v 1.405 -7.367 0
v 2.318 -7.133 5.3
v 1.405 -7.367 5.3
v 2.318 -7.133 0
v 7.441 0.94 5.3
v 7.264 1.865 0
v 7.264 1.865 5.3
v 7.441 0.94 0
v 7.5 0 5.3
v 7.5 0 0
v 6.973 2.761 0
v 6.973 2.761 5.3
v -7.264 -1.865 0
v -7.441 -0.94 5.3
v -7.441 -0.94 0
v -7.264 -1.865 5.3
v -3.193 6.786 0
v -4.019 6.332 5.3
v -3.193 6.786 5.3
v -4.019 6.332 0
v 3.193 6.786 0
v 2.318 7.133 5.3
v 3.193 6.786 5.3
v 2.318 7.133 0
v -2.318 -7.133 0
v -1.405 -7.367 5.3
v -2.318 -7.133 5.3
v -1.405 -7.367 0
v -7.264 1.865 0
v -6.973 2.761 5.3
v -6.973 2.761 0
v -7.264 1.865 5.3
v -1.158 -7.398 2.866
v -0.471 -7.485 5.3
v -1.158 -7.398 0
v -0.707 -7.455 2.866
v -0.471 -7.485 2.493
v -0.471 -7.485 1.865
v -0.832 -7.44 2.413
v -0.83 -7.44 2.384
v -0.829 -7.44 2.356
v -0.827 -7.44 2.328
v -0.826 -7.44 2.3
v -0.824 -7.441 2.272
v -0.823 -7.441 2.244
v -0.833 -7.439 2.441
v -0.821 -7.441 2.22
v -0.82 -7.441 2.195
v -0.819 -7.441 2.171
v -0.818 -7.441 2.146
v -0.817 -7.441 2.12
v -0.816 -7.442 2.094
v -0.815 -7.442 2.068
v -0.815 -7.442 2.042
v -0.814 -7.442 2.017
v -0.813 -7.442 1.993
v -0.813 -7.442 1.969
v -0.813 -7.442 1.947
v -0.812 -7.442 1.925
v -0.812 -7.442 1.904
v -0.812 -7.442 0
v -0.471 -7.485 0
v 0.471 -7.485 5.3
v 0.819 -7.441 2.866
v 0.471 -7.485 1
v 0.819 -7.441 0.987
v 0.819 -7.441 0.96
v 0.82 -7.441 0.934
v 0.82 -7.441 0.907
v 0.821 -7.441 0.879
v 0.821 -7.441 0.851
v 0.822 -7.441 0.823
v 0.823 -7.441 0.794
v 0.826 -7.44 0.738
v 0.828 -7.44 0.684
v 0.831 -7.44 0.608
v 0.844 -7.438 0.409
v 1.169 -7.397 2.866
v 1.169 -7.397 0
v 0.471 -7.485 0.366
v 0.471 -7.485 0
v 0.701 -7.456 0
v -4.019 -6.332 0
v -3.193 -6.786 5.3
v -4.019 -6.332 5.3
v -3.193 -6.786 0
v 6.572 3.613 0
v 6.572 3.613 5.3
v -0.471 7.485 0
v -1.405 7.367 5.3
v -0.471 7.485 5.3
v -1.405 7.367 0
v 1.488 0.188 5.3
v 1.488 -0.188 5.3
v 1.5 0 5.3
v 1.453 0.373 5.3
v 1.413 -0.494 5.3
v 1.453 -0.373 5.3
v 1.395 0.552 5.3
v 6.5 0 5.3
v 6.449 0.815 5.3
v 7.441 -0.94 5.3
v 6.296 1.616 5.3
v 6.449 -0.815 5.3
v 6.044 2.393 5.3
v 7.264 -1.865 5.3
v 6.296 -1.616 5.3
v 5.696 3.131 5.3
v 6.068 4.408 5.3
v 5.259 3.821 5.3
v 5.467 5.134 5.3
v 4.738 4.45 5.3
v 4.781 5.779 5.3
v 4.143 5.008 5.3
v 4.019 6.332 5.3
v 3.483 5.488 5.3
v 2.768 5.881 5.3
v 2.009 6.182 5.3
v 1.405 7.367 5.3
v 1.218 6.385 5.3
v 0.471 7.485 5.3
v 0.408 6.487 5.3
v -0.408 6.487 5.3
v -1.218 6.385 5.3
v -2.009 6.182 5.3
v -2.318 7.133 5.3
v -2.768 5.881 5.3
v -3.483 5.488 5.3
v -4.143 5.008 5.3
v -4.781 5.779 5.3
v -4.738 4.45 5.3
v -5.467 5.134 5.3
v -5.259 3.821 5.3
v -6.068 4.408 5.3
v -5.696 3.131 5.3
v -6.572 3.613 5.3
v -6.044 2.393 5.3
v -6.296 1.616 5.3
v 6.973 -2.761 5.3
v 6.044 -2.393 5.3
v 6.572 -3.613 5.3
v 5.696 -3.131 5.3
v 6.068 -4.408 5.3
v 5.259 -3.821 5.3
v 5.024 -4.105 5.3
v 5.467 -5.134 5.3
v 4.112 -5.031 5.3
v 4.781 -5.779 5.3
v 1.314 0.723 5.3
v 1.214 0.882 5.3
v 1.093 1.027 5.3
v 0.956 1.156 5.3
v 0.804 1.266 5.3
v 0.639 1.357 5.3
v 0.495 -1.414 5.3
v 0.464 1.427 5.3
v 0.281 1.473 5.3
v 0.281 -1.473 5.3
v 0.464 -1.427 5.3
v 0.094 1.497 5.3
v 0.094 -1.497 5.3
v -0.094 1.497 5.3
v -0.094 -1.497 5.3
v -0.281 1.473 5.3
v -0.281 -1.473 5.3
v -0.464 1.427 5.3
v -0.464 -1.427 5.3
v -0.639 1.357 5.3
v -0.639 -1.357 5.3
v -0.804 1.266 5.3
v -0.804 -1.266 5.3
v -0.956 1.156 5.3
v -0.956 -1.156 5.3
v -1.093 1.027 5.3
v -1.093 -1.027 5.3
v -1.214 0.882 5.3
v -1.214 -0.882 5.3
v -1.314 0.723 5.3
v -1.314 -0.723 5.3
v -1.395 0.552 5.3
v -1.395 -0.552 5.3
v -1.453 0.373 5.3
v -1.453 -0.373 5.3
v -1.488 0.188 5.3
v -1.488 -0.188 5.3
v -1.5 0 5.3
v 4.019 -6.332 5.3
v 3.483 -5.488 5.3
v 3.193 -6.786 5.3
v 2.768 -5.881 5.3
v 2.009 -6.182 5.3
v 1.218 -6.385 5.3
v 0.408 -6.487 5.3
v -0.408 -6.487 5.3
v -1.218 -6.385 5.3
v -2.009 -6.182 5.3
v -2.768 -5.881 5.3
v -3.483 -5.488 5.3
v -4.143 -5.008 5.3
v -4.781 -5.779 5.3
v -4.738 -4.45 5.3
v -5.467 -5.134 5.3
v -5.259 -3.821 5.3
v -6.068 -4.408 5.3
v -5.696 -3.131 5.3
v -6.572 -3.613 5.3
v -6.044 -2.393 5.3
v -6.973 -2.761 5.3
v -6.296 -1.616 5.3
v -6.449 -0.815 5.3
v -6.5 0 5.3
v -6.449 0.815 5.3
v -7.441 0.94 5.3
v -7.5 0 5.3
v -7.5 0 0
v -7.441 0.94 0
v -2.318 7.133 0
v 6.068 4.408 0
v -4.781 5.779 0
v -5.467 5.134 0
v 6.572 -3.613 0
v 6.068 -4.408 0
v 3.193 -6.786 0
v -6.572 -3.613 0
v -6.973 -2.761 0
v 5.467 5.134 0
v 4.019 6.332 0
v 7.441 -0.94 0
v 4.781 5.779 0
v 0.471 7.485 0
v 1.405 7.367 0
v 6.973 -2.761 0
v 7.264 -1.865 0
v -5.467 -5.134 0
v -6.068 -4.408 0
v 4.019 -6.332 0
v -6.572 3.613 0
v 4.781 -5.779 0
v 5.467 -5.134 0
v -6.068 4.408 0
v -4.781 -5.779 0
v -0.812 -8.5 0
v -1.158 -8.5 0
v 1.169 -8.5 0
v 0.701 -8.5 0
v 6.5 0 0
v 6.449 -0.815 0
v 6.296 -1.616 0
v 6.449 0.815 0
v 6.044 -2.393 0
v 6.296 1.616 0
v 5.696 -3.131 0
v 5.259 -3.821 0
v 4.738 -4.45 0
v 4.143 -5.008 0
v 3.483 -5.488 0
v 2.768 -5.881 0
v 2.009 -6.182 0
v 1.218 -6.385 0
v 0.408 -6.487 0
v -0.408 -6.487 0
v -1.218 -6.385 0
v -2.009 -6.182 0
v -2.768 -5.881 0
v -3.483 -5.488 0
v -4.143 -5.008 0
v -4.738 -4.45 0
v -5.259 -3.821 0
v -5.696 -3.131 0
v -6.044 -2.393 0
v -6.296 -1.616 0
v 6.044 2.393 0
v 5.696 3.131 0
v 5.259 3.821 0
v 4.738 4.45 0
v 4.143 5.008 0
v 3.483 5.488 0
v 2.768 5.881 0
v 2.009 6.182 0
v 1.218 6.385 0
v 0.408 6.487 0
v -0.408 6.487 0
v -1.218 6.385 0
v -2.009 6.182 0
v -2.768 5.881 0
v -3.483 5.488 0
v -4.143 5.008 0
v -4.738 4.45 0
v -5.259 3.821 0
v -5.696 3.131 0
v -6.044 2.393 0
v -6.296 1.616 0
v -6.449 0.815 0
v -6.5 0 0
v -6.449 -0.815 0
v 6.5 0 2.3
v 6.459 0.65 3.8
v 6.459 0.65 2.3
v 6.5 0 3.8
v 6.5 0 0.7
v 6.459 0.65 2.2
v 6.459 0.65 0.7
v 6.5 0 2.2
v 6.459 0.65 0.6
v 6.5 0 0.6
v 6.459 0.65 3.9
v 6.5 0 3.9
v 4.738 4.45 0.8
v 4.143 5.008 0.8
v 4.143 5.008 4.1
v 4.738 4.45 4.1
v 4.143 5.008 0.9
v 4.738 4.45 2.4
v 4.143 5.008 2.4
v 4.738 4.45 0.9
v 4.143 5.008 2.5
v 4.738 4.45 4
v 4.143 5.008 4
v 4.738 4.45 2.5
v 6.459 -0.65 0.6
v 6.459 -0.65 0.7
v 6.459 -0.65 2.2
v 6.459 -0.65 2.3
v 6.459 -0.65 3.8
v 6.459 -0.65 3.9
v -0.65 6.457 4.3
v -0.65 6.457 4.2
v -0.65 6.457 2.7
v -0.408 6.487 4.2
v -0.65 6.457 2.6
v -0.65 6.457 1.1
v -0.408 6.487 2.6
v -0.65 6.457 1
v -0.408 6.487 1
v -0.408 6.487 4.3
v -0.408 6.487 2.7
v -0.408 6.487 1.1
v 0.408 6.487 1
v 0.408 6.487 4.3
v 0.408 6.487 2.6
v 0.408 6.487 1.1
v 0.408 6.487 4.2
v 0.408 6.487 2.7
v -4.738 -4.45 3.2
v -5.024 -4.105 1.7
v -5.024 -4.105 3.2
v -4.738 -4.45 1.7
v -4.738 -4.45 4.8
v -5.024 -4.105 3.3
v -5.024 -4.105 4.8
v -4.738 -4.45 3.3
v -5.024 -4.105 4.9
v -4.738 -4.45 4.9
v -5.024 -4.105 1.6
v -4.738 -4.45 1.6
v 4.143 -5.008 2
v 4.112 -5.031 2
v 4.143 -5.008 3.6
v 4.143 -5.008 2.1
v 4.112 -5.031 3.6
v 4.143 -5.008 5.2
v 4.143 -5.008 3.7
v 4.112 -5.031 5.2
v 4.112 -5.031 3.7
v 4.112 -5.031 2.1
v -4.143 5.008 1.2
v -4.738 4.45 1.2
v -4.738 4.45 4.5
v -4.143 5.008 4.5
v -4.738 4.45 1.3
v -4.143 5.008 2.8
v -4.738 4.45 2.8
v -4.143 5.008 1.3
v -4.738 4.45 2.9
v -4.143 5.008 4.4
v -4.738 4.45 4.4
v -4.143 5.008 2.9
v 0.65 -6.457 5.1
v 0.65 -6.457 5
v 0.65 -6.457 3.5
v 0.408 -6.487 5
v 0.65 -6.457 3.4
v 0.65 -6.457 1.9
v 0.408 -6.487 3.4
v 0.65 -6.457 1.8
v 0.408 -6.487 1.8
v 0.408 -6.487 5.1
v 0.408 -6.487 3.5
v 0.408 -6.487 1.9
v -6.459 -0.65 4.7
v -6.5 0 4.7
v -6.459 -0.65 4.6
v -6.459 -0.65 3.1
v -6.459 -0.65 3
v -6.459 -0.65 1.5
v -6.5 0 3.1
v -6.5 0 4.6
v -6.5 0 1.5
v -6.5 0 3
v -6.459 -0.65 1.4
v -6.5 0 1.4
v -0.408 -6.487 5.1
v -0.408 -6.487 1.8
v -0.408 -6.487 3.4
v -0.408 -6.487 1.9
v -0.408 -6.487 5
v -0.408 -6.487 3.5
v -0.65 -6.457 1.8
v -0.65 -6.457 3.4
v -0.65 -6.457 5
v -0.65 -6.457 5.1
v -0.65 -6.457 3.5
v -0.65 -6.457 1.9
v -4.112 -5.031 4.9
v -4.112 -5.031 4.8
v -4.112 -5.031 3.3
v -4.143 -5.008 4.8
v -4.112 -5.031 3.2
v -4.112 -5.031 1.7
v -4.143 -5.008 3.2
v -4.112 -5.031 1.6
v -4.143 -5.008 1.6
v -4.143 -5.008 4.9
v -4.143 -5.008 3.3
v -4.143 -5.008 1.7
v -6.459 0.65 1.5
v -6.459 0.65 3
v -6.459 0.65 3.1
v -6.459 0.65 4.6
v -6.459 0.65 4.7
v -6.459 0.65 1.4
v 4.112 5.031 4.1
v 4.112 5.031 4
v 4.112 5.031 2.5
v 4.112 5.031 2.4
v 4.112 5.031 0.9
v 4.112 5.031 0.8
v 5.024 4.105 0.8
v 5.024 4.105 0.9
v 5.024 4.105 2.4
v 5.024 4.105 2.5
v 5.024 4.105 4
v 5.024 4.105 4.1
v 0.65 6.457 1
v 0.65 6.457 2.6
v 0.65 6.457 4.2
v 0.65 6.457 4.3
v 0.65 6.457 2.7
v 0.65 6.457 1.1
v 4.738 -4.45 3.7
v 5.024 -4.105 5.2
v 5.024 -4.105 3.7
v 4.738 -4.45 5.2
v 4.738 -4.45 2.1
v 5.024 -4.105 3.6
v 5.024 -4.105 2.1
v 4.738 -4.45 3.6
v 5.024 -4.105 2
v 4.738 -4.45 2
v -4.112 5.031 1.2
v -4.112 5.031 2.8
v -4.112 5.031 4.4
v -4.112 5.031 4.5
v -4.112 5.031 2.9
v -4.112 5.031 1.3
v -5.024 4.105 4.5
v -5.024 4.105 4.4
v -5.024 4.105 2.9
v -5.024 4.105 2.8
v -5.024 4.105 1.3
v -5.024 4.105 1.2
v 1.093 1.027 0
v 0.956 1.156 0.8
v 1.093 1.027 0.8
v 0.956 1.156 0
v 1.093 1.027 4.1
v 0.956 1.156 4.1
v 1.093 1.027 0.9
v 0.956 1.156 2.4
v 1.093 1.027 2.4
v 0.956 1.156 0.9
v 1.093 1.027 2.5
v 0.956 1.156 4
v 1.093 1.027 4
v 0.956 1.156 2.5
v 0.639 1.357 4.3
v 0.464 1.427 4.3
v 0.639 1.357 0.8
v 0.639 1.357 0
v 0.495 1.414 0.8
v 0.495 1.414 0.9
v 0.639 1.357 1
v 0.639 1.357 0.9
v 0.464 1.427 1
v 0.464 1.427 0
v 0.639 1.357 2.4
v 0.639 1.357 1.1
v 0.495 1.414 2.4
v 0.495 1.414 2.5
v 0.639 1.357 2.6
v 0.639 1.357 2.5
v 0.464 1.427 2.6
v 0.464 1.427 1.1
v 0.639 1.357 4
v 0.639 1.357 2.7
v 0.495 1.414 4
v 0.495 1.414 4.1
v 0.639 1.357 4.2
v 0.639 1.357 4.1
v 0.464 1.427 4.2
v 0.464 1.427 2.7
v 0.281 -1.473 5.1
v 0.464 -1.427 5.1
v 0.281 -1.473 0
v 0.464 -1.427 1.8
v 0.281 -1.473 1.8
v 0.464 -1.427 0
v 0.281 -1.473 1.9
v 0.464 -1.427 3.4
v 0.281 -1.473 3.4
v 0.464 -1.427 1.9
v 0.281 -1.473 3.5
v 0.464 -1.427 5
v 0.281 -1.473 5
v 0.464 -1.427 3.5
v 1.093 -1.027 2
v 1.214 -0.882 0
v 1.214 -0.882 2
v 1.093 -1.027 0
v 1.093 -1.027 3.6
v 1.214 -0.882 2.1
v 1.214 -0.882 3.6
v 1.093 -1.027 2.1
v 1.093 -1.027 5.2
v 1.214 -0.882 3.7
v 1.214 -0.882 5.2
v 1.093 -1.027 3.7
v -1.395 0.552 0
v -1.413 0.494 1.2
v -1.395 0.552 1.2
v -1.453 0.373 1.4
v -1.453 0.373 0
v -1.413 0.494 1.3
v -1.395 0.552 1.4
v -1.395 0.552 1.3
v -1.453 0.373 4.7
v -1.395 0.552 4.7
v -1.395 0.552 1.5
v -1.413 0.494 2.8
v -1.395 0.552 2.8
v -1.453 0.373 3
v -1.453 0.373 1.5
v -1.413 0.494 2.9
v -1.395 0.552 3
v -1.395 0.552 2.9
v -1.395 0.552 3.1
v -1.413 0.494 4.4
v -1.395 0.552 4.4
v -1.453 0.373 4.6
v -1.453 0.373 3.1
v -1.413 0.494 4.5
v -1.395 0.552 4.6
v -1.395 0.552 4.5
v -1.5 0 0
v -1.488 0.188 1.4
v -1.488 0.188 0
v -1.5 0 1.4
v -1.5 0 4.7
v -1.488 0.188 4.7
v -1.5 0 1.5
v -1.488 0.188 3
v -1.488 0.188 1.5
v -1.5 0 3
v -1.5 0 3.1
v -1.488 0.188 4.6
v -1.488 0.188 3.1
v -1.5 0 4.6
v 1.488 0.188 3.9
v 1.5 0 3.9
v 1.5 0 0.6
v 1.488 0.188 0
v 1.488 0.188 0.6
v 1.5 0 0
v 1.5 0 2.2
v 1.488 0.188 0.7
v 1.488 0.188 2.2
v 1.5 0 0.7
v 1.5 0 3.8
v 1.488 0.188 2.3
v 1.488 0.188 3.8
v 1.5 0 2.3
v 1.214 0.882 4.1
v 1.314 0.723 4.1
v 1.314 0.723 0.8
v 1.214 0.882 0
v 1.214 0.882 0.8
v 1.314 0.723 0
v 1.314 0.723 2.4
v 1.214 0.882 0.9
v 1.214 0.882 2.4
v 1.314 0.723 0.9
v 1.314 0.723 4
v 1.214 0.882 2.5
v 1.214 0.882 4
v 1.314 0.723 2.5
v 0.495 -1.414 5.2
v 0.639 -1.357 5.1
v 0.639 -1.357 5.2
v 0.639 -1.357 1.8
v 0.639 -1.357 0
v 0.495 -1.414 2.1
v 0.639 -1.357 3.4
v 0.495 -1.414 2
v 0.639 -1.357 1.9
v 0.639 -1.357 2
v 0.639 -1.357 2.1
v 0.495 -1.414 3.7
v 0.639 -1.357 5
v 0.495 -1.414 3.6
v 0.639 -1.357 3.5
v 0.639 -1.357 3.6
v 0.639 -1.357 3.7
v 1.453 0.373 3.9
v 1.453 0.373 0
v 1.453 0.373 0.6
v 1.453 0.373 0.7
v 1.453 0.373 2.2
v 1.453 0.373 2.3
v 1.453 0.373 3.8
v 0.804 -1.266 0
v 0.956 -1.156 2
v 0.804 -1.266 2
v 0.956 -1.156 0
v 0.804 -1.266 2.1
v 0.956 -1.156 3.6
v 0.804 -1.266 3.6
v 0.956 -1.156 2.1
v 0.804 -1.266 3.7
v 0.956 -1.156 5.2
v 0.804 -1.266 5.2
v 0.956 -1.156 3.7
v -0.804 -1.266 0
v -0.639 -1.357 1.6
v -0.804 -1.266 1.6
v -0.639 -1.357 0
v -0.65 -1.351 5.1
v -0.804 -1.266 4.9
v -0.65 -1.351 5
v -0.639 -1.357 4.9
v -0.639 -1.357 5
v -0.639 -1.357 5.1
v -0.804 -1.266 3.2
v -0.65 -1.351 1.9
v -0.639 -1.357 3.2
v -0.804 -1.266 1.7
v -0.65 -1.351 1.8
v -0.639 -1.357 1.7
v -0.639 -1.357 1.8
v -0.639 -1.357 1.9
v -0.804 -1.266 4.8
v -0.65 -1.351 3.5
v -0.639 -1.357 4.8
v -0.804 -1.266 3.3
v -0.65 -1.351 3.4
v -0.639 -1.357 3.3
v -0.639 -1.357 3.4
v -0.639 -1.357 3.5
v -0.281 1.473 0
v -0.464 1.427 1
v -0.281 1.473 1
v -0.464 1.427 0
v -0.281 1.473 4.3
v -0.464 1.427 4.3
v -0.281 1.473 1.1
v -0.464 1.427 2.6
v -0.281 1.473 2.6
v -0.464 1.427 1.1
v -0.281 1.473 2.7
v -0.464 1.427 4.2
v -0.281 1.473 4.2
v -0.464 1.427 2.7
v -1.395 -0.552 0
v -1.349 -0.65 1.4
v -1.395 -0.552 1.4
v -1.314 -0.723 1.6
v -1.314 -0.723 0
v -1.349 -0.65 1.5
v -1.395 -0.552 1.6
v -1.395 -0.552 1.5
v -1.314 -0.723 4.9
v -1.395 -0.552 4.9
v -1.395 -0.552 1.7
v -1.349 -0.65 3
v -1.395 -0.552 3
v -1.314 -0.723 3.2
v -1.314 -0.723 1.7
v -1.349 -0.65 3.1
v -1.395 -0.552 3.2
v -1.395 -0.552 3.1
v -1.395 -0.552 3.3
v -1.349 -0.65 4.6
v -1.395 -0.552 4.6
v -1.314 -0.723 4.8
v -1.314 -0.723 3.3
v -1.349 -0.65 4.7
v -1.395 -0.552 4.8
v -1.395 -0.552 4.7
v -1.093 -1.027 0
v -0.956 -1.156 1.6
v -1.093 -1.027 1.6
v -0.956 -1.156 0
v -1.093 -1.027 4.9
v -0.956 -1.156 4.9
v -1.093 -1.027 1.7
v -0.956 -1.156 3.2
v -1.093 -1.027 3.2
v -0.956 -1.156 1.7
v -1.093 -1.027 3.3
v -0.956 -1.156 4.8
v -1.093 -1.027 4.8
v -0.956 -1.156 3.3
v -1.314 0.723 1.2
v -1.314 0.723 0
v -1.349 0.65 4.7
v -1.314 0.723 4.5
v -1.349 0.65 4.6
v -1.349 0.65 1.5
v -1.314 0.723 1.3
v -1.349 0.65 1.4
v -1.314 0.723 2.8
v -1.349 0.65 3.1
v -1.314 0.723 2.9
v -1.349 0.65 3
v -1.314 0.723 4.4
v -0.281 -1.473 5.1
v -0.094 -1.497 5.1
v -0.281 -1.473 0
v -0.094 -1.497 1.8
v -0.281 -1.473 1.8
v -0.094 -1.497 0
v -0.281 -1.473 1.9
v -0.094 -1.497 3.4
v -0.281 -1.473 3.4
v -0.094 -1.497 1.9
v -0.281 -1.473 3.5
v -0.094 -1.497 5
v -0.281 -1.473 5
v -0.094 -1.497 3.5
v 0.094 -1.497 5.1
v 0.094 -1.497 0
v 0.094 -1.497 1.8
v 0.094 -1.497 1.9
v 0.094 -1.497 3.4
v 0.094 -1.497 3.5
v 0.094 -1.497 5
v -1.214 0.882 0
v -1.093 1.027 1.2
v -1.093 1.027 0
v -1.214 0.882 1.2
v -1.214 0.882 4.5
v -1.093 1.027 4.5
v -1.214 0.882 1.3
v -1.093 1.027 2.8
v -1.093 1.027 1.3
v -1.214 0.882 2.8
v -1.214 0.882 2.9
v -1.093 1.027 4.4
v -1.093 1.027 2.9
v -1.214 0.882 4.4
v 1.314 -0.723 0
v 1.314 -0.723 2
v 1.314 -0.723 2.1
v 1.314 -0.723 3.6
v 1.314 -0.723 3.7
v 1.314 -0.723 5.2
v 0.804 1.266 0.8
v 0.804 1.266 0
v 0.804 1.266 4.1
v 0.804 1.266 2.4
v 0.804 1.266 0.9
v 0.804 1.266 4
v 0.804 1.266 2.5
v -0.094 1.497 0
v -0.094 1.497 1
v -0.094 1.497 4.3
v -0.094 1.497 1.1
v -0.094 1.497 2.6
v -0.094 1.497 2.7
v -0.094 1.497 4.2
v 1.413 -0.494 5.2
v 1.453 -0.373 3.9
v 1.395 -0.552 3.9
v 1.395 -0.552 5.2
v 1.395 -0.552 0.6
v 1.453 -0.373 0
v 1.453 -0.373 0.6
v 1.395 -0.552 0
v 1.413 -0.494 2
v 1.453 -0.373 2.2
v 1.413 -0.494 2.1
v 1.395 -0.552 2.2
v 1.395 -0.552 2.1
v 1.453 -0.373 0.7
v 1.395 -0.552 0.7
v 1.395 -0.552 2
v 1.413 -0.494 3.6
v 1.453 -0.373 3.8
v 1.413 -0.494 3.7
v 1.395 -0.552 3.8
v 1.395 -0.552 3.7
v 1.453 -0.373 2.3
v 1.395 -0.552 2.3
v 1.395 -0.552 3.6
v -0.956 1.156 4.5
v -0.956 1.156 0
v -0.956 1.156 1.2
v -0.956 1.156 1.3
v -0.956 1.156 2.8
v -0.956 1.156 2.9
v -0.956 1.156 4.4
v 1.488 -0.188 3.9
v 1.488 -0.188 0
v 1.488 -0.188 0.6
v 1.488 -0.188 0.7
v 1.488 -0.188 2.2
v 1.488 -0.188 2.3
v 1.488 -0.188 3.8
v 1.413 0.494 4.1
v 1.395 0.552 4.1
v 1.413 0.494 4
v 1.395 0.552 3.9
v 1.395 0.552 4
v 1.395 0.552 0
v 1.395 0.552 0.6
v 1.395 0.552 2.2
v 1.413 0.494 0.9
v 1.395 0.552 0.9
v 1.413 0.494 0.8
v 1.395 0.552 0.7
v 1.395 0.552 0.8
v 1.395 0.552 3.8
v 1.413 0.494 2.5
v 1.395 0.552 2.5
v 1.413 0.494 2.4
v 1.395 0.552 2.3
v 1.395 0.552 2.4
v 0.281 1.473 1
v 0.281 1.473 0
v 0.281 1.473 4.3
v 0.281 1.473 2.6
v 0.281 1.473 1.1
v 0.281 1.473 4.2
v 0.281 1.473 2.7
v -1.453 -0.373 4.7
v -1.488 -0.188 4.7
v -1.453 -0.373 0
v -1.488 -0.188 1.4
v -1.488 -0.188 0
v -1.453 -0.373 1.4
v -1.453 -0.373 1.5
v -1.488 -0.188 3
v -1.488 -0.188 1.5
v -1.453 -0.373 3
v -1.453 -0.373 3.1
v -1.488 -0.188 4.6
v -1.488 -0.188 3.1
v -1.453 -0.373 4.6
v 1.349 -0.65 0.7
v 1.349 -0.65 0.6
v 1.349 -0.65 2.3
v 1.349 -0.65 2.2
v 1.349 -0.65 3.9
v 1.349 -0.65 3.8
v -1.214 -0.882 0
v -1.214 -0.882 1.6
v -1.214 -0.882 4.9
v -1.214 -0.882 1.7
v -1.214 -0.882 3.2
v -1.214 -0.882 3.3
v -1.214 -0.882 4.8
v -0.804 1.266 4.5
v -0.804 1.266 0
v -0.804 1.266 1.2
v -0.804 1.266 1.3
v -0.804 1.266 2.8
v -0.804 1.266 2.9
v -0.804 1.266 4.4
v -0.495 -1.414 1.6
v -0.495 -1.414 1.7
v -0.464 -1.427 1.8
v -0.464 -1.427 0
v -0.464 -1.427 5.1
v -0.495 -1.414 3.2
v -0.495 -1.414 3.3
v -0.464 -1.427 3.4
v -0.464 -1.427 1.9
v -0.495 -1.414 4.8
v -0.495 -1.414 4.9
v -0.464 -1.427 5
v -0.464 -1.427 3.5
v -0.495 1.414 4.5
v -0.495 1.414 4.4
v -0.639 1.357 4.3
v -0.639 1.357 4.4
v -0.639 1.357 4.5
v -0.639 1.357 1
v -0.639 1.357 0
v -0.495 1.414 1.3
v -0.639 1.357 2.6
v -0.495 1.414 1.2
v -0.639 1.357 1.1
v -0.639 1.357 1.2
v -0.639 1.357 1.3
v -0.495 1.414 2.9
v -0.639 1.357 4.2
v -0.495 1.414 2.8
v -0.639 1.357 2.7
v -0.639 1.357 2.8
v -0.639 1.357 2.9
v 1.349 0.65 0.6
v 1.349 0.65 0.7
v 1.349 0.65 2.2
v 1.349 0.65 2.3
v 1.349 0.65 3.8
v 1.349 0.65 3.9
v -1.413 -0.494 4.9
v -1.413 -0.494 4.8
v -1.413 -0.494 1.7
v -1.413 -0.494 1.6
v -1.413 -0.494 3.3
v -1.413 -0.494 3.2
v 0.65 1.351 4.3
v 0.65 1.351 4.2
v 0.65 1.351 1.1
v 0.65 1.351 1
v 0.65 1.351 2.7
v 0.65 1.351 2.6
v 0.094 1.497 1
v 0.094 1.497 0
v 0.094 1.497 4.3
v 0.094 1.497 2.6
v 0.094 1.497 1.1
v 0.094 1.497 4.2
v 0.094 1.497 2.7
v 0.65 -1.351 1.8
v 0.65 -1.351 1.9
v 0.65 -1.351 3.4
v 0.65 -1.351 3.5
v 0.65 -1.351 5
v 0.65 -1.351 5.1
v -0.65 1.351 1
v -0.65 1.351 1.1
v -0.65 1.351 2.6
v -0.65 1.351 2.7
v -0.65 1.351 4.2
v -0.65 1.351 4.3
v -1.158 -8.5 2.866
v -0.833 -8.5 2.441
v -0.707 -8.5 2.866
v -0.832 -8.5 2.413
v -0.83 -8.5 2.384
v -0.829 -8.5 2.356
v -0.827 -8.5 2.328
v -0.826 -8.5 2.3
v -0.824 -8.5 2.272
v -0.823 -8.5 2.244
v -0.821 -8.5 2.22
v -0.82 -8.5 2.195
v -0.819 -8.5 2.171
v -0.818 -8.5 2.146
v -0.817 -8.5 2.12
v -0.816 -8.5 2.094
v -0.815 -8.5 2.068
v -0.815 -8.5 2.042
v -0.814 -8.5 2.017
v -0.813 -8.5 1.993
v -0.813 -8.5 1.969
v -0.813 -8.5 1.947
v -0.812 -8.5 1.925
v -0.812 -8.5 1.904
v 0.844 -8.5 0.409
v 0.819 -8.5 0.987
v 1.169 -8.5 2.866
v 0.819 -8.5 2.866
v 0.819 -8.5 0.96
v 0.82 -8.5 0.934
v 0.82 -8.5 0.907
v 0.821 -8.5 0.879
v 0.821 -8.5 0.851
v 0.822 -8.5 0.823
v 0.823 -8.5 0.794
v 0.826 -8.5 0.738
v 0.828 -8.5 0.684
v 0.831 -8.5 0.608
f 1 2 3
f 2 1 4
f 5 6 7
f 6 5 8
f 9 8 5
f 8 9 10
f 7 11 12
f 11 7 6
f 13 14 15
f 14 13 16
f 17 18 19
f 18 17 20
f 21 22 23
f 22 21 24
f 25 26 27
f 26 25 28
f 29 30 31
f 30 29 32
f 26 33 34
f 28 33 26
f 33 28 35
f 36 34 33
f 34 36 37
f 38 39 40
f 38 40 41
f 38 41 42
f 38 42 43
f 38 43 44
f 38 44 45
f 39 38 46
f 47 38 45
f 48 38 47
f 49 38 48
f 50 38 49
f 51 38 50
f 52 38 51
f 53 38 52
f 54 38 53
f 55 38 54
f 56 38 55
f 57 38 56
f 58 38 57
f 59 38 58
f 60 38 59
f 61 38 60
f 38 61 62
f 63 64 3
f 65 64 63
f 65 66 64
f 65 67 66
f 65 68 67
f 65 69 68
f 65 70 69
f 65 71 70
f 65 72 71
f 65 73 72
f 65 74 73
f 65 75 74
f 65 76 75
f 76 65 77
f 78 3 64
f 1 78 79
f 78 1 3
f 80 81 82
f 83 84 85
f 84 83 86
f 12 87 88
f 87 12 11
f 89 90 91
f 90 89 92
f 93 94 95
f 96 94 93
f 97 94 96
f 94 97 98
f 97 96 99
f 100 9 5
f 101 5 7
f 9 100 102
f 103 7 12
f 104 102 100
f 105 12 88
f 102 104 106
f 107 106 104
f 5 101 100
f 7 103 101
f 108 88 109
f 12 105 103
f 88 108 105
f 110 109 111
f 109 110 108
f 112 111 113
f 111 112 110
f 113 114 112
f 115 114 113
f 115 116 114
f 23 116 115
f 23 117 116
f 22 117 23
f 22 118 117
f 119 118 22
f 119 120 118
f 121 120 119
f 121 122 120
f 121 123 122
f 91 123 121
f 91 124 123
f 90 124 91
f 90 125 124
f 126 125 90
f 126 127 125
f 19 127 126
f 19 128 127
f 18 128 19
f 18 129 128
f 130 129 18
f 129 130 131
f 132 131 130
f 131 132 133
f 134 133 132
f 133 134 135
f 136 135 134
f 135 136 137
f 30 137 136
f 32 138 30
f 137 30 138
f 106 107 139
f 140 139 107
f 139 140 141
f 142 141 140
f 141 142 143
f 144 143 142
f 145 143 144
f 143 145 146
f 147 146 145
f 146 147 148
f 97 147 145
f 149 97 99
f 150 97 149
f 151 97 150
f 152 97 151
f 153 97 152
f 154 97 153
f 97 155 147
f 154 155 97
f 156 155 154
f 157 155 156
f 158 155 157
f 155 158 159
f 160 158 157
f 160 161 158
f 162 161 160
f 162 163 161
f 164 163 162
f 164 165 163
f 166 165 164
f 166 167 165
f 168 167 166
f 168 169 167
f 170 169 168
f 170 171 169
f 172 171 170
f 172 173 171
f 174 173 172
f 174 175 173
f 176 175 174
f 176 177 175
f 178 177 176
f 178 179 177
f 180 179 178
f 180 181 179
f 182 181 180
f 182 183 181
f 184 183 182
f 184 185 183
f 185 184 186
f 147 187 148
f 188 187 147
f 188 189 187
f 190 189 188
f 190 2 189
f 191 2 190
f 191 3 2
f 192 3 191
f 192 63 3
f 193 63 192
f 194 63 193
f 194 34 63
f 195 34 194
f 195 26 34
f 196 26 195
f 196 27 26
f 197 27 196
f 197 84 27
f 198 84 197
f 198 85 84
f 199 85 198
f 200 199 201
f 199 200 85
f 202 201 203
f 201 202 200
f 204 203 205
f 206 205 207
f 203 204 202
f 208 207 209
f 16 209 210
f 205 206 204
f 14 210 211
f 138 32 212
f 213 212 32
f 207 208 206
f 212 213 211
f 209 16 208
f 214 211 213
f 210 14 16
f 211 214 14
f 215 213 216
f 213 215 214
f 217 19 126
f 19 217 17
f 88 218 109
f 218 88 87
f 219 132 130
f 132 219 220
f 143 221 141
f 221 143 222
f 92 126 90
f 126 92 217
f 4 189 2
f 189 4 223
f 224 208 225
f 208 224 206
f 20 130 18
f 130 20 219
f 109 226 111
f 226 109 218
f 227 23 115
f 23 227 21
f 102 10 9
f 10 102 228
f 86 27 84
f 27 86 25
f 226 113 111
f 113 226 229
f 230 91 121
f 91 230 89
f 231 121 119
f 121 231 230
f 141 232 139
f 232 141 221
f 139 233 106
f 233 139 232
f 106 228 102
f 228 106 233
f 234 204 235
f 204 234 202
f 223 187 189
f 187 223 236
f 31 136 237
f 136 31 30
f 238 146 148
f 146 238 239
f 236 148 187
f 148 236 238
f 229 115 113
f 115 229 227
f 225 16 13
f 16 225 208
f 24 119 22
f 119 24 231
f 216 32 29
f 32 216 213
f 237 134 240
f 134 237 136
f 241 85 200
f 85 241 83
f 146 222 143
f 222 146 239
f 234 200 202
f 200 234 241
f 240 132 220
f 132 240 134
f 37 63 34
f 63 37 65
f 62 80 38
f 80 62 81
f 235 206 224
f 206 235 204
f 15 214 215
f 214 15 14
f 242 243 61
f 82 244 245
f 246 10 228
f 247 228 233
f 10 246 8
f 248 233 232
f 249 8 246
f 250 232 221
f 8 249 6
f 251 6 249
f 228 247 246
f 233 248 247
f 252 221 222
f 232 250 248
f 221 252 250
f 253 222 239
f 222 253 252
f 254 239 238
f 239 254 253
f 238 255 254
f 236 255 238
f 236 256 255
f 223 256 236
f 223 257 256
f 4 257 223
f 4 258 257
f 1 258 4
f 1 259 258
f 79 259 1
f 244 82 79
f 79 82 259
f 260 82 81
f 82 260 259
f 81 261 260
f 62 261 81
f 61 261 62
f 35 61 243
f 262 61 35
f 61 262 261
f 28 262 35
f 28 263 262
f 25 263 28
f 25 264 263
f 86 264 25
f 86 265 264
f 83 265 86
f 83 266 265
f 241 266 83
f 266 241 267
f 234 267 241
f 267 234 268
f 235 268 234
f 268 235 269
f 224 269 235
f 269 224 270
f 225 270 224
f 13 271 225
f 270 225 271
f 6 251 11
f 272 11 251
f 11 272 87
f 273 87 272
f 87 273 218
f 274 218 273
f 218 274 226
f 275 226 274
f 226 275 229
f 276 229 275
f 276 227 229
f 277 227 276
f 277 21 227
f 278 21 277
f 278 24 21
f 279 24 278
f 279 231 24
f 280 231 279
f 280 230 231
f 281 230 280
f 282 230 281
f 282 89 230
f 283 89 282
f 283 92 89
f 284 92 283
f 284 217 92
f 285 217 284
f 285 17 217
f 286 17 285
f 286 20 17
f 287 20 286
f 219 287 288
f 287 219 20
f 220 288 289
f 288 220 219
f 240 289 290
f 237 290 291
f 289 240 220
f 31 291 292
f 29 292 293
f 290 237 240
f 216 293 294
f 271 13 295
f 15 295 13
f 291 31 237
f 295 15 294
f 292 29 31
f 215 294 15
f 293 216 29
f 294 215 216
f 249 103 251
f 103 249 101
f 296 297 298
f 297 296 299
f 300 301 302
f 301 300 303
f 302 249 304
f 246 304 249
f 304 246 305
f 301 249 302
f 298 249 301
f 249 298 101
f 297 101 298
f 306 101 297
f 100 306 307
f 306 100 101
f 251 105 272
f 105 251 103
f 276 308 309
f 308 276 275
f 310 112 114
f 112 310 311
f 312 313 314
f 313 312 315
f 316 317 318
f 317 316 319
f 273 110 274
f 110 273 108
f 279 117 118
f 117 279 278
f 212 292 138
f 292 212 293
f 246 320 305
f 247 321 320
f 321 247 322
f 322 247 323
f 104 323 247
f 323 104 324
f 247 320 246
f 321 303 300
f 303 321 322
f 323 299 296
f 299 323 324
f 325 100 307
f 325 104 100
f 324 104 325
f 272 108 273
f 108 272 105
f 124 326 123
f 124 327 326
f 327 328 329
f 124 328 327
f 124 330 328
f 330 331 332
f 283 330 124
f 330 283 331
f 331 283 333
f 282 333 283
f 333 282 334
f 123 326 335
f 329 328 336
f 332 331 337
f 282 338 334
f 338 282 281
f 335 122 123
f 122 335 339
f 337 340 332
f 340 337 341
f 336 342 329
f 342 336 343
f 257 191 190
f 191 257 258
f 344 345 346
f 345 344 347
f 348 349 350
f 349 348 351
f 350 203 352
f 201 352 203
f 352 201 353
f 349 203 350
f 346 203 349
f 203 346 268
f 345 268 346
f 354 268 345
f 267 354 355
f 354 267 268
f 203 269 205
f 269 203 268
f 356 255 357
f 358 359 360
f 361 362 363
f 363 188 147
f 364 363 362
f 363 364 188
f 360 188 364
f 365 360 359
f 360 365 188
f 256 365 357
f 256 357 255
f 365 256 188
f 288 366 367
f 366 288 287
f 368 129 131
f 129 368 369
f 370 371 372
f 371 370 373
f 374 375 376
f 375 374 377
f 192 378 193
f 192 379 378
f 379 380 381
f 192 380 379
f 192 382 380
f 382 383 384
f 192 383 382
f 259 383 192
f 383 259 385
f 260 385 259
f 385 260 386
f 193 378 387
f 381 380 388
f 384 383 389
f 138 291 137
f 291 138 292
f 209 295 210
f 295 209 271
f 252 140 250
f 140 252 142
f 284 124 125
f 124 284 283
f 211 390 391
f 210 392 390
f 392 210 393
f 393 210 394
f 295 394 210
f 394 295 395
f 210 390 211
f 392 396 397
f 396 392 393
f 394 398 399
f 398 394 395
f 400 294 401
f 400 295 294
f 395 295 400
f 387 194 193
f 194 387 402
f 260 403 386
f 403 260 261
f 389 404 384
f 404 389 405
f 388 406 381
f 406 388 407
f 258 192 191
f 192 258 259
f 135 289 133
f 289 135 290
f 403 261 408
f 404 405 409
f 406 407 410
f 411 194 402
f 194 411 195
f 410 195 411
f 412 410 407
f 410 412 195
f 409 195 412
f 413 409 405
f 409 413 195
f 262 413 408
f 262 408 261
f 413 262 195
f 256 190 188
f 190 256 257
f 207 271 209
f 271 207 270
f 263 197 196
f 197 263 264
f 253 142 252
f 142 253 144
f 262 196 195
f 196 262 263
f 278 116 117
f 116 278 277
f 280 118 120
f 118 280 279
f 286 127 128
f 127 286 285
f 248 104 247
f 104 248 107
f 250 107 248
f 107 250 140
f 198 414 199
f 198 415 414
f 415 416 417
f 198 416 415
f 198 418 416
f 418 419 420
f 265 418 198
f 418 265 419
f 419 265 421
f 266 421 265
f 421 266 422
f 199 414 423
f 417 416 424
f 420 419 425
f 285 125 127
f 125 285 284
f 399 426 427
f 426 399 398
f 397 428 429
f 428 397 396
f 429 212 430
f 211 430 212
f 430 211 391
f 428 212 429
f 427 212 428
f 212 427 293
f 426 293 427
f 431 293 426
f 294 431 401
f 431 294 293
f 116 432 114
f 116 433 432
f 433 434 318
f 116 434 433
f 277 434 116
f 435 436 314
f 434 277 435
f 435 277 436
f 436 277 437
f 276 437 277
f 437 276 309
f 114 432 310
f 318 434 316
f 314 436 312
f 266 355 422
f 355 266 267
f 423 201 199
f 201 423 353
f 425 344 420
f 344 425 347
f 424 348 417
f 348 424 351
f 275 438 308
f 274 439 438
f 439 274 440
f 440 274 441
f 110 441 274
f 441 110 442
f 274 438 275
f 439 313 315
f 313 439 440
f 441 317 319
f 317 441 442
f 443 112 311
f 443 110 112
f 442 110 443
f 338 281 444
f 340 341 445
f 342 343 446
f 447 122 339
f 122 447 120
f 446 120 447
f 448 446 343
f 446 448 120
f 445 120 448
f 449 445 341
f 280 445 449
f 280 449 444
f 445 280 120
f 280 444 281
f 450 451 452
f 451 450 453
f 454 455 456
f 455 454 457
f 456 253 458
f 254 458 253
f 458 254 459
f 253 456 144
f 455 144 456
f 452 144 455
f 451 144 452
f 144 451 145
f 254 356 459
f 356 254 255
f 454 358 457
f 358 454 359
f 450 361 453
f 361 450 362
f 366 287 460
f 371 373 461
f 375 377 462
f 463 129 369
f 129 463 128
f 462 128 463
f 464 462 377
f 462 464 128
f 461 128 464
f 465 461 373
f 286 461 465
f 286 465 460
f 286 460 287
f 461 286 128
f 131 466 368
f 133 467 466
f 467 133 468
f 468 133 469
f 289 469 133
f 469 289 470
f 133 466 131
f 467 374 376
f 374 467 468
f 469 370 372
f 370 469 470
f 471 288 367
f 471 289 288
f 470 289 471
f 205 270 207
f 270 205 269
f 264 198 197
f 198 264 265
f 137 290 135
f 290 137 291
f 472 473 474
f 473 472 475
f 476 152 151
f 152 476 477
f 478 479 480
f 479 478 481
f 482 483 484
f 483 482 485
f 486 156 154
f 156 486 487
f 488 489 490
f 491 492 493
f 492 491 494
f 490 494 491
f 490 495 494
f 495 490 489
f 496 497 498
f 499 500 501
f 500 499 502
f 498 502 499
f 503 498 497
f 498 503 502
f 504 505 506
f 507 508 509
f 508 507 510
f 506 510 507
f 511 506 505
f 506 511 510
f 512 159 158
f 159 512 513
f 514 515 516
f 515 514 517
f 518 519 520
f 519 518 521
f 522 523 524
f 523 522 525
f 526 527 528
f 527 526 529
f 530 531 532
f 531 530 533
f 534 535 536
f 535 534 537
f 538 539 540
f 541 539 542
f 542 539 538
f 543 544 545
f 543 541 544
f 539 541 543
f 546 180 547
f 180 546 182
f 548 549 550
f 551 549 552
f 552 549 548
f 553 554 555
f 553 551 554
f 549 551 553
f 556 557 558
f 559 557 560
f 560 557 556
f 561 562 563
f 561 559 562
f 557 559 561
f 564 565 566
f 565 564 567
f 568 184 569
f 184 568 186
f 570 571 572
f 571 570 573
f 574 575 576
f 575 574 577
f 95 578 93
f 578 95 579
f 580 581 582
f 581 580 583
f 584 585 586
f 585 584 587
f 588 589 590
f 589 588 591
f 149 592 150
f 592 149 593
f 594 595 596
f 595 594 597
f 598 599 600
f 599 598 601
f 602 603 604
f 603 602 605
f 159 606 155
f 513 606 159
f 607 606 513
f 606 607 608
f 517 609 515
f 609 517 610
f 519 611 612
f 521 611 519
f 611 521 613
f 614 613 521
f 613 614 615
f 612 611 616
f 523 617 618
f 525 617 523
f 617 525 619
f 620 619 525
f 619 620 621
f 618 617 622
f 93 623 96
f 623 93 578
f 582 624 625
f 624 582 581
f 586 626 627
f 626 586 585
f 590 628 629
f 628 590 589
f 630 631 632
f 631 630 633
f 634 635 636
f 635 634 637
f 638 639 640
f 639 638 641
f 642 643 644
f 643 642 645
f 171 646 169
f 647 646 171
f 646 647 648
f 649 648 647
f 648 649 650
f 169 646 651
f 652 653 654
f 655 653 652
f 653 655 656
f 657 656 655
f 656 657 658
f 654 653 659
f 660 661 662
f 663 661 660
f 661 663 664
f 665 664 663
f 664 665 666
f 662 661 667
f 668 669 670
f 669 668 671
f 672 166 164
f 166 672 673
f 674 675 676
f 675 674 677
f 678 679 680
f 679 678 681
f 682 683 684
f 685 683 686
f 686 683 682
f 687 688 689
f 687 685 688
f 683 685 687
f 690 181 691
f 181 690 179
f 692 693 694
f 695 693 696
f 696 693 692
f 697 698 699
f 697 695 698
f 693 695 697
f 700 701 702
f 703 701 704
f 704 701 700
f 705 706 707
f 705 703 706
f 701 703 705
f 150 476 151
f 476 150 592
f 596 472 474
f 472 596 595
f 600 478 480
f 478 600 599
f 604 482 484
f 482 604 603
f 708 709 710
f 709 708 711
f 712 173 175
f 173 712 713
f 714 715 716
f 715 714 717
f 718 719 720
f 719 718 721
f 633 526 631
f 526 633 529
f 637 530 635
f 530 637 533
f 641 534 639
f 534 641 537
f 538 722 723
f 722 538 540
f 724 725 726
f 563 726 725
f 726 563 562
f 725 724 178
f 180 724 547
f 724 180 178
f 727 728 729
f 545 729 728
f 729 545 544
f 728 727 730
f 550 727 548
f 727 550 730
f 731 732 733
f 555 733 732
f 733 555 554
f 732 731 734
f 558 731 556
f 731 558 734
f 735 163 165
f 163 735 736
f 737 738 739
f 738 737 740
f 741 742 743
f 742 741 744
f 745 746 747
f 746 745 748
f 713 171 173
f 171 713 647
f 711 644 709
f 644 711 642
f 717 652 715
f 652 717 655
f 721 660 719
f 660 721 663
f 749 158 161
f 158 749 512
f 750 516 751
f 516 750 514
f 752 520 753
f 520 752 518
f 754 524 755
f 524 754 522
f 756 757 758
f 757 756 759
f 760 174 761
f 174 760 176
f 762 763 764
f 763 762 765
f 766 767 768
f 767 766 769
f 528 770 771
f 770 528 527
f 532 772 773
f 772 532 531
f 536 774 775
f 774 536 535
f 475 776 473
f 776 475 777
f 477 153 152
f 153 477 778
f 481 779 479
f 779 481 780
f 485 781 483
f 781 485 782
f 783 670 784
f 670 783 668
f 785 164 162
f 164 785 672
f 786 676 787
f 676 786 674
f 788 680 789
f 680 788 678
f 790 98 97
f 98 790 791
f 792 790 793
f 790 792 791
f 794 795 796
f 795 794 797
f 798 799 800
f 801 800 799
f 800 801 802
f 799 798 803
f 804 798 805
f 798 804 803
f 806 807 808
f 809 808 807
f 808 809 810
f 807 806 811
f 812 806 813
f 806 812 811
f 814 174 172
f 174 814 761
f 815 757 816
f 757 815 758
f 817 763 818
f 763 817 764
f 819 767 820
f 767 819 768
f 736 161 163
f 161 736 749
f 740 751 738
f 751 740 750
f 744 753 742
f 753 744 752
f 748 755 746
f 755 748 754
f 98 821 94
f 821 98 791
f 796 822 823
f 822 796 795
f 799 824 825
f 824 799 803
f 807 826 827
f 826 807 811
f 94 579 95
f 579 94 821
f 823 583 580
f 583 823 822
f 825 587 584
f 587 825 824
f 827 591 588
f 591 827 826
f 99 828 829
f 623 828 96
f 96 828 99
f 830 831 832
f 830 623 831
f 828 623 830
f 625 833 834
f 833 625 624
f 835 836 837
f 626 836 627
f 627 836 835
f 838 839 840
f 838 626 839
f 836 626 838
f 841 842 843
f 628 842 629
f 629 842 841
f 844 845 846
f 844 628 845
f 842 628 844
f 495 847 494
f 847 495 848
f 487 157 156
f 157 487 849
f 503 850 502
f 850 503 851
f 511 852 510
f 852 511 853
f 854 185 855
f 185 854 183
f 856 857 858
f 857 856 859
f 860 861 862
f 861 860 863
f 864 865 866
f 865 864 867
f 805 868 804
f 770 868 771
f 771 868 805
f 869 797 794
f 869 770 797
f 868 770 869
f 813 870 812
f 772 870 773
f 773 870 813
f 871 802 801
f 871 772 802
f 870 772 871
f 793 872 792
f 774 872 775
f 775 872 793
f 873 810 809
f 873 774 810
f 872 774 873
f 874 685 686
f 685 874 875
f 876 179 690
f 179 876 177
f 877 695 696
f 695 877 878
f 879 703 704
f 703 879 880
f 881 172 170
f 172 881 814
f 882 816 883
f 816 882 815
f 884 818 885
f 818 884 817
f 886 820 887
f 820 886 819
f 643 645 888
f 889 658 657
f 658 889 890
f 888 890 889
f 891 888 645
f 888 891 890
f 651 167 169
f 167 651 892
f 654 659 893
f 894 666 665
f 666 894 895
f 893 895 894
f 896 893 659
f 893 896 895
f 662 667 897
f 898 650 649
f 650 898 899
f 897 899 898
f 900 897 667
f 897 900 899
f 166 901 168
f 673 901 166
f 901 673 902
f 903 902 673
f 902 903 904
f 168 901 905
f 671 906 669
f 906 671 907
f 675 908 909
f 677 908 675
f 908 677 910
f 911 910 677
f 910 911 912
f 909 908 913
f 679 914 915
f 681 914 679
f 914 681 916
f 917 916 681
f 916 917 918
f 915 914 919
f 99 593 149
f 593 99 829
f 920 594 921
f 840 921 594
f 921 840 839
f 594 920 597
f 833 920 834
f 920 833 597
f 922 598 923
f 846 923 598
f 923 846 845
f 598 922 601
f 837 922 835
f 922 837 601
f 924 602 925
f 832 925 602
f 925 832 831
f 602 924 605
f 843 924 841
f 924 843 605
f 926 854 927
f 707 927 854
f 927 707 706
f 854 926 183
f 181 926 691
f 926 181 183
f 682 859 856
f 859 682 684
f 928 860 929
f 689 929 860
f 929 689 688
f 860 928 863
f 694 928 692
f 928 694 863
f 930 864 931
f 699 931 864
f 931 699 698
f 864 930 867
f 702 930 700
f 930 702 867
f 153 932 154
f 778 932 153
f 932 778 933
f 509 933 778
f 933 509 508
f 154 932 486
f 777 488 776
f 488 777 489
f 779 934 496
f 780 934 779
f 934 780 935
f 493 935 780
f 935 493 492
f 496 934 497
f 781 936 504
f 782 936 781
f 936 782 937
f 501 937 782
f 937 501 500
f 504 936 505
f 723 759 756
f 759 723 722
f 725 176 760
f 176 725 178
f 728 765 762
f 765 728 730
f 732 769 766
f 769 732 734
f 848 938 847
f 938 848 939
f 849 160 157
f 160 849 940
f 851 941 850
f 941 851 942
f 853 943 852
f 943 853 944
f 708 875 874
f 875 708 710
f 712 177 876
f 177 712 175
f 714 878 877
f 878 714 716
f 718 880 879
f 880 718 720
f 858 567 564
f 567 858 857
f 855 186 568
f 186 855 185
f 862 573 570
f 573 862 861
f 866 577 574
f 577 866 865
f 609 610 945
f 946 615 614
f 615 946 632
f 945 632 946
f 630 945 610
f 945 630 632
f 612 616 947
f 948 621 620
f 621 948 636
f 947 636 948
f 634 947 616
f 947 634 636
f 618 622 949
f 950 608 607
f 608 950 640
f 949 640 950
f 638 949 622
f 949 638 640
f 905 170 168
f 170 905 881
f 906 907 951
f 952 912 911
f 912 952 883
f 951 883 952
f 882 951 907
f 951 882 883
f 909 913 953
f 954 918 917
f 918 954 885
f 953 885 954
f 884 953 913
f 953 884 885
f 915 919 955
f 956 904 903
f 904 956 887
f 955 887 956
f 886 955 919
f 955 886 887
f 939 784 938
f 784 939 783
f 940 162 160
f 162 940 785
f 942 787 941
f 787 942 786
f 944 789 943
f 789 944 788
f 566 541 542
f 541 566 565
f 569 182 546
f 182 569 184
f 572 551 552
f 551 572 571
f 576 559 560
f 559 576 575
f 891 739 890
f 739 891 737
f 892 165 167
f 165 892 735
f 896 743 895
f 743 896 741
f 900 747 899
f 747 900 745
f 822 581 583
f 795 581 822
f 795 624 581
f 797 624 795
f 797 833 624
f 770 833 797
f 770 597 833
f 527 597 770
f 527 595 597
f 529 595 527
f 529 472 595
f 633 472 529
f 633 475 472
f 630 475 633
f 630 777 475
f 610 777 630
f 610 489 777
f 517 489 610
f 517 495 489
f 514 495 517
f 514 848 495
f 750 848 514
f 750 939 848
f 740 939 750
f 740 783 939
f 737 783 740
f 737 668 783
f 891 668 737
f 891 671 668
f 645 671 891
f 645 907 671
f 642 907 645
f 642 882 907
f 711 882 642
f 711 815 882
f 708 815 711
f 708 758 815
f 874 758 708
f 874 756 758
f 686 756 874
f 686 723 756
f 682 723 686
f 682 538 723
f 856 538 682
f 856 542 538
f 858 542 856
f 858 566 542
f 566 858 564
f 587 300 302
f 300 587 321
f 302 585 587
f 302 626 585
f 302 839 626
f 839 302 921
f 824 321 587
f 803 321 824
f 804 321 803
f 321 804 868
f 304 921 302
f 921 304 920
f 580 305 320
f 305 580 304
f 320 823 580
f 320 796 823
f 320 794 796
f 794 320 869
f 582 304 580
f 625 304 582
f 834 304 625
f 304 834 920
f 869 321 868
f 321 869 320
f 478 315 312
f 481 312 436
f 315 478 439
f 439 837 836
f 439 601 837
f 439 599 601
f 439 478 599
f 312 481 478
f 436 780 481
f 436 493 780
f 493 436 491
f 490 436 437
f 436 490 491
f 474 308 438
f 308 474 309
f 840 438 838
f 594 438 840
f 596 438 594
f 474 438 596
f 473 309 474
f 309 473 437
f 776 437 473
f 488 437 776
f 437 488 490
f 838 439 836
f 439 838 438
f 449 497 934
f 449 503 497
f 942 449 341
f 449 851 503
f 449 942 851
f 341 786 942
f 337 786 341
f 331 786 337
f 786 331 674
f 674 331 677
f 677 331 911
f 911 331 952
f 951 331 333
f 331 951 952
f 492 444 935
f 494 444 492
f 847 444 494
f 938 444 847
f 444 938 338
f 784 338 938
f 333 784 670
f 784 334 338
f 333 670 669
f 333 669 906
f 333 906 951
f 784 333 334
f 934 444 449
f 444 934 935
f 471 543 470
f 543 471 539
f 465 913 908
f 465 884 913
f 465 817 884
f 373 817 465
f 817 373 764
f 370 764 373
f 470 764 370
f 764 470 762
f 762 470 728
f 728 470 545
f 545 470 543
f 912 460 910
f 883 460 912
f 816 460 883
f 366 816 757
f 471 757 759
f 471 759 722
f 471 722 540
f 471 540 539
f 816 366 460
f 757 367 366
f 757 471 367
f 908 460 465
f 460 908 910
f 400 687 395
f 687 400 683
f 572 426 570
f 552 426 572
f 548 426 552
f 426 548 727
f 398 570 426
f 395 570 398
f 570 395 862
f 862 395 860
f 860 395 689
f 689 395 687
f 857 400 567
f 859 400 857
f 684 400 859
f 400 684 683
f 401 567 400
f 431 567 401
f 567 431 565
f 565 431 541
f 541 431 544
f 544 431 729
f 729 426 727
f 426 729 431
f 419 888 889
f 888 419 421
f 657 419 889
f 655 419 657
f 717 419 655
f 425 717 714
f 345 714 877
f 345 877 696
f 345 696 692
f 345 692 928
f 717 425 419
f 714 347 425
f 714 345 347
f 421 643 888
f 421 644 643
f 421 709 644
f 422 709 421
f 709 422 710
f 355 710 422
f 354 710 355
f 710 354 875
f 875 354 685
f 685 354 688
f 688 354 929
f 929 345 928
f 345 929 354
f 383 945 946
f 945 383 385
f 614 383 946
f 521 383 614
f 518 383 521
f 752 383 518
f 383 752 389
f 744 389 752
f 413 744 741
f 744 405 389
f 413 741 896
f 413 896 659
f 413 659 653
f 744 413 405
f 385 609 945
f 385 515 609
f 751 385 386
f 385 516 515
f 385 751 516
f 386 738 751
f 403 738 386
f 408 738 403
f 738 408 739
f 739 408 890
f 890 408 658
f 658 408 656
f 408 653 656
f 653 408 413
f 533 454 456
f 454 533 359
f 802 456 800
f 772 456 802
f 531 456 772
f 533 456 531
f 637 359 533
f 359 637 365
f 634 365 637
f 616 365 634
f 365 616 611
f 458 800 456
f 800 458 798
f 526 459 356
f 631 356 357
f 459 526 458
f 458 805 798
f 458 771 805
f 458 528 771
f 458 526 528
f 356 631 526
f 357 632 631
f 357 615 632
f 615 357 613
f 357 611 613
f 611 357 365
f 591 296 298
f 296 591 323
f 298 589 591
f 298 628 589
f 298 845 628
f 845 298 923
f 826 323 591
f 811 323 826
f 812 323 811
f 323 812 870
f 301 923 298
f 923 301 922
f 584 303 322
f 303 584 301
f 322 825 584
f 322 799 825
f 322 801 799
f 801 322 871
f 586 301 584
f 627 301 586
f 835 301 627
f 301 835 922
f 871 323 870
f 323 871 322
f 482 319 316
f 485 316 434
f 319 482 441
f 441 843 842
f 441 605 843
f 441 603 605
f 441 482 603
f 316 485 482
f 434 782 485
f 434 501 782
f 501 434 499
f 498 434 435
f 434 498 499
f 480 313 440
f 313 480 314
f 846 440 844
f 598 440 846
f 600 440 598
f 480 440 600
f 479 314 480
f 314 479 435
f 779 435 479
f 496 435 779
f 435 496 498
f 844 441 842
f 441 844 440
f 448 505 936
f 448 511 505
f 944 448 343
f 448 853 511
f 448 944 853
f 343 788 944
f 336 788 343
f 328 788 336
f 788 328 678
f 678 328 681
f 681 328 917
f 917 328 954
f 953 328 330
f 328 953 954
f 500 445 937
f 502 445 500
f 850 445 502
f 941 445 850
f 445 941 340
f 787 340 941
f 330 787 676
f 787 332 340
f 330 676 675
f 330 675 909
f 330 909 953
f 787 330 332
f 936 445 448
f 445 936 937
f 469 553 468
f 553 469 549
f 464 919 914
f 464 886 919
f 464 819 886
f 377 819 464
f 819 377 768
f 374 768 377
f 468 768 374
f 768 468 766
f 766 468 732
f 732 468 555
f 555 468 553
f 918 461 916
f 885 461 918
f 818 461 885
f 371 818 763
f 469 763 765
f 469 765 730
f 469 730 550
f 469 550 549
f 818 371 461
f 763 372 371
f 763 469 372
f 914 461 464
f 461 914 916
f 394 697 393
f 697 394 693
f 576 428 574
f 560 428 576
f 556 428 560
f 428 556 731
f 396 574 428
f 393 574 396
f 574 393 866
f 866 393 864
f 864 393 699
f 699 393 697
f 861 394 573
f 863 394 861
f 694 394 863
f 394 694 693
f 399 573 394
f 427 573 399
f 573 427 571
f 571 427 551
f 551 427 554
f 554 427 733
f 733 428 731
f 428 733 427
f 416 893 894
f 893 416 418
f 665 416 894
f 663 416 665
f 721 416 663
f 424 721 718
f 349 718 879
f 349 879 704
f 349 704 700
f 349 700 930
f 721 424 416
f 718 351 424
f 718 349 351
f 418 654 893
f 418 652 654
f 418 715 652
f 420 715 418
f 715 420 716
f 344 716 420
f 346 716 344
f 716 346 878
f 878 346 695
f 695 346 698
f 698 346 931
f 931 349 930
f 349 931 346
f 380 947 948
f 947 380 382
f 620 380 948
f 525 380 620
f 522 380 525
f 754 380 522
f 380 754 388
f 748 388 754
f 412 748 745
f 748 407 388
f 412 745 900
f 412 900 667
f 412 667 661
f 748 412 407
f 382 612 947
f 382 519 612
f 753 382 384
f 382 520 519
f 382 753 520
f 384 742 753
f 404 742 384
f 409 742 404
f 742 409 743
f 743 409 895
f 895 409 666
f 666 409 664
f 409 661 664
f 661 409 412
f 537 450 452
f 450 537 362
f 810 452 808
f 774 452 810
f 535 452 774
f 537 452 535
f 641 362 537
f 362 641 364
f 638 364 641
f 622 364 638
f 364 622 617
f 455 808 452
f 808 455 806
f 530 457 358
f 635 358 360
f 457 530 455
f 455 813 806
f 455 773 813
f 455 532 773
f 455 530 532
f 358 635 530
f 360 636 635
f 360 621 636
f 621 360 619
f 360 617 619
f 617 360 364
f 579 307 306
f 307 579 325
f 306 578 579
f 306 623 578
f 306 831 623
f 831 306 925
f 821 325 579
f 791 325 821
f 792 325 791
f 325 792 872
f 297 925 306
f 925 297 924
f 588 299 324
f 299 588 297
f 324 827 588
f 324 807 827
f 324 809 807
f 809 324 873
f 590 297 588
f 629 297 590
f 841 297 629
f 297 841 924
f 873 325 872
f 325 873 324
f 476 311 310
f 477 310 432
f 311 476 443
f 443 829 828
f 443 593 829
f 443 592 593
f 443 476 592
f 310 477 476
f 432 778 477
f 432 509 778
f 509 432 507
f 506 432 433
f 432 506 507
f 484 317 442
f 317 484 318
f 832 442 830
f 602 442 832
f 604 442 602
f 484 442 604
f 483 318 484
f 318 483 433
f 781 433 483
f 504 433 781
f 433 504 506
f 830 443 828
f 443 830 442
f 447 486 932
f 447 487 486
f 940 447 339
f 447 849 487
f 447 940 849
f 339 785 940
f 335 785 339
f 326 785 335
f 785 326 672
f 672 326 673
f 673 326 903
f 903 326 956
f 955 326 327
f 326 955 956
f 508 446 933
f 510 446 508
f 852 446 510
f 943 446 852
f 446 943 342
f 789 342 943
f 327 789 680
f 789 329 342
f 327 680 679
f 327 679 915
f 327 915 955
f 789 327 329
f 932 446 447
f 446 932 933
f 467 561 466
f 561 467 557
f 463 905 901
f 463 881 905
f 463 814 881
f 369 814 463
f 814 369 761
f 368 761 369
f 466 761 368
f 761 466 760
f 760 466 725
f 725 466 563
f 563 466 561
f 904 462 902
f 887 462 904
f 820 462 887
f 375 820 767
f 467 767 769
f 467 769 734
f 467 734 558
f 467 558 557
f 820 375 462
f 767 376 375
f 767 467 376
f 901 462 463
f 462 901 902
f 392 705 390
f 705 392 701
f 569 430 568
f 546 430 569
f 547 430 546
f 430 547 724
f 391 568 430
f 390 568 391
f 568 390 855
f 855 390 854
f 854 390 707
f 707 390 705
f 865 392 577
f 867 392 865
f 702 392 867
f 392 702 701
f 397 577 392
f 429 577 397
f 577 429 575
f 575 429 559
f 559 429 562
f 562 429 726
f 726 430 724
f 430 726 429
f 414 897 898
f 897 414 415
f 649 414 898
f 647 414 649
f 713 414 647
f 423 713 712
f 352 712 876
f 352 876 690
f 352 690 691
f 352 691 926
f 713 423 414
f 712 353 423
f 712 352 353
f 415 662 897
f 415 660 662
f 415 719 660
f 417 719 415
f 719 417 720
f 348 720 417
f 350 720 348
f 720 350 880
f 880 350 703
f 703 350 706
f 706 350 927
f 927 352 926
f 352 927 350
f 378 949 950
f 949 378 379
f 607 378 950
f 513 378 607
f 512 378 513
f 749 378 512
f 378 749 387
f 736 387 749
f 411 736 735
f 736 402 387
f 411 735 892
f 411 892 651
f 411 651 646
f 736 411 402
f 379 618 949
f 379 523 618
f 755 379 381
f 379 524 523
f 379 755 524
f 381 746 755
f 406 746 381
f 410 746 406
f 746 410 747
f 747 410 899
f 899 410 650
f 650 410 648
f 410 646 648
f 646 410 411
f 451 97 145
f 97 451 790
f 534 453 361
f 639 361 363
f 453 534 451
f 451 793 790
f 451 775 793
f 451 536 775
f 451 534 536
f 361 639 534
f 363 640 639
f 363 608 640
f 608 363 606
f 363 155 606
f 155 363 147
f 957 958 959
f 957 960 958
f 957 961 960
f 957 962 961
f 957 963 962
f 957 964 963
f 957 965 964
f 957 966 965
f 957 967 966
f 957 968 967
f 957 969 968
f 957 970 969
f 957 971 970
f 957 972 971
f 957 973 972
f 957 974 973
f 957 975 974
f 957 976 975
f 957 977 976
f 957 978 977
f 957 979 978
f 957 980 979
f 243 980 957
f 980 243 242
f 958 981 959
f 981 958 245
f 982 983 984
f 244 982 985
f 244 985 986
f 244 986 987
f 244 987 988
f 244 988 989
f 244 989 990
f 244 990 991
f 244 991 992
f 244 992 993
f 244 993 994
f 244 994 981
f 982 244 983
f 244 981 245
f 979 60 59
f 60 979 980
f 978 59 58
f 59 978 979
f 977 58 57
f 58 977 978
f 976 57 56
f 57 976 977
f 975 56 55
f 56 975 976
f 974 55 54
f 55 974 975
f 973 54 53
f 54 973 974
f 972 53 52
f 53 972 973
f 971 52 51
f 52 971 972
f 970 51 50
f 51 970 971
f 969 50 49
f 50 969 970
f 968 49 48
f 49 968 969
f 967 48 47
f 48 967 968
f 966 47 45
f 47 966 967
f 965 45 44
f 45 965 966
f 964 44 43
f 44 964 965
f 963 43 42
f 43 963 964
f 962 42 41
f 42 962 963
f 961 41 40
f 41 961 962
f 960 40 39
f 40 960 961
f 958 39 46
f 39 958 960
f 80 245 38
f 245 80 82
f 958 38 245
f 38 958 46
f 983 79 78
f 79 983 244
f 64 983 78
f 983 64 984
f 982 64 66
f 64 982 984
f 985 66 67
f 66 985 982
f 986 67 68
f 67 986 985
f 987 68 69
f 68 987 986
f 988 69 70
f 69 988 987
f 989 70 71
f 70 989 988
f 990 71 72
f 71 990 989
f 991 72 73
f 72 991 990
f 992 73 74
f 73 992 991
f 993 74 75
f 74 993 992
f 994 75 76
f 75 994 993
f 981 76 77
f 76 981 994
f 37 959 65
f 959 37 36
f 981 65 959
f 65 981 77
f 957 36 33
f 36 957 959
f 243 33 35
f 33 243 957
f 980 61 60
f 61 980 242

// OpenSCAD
/* [ Miscellanious ] */
// Resolution for circular patterns
resolution = 50; // [30, 50, 100, 200]
// Includes an "N" in the negative Y side of the sample
show_north = true; // [true, false]

$fn = resolution;


/* [ Microstructure ] */
// Core diameter
core_diameter = 3;
// Suspension diameter
susp_diameter = 1.3;
// Suspension height
susp_height= 0.1;
// Suspension angle [deg]
susp_angle = 0;
// Suspensionless length
susp_distance = 0.2;
// Number of suspenders
N_susp = 1;
// Spiral suspenders?
SPIRAL_SUSP = true; // [false, true]
// Number of suspenders to cause an exact rotation
SPIRAL_NSUSP = 8;
// Are the suspenders unidirectional?
UNIDIRECTIONAL_SUSP = true; // [false, true]


/* [ Outer Structure ] */
// Shell inner diameter
s_inner_diameter = 13;
// Shell outer diameter
s_outer_diameter = 15;
// Preform length
preform_length = 5.3;


susp_len = (s_inner_diameter - core_diameter)/2;
susp_correction = susp_diameter * tan(susp_angle);
suspender_length = susp_len/cos(susp_angle) + susp_correction;
suspender_height = suspender_length * sin(susp_angle);

echo("Suspender height:", suspender_height);


N_suspensions = ceil( (preform_length-suspender_height) / susp_distance );


module core(){
    cylinder(preform_length, d=core_diameter);
}


module shell(){
    difference(){
        cylinder(preform_length, d=s_outer_diameter);
        cylinder(preform_length, d=s_inner_diameter);
    }
}


module suspender_shape(){
    //cylinder(suspender_length, d=susp_diameter);
    translate([0,0,-1])
    linear_extrude(suspender_length+1)
        translate([-susp_height/2, -susp_diameter/2, 0])
            square([susp_height, susp_diameter]);
}


module suspender(){
    translate([core_diameter/2,0,0])
        rotate([0, 90-susp_angle, 0])
            translate([-susp_diameter/2,0,0])
                suspender_shape();
}


module anti_suspender(){
    translate([s_inner_diameter/2,0,-suspender_height])
        rotate([0, susp_angle-90, 0])
            translate([susp_diameter/2,0,0])
                cylinder(suspender_length, d=susp_diameter);
}


module suspension(N=3){
    assert(N>0, "Number of suspenders must be at least 1");
    
    union(){
        for(i=[1:N], theta=360*i/N){
            rotate([0,0,theta])
                suspender();
        }
    }
}


module repeating_suspensions(){
    
    intersection(){
        cylinder(h=preform_length, d=s_inner_diameter);
        union(){
            for(i=[0:N_suspensions-1], H=i*susp_distance){
                translate([0,0,H])
                    suspension(N=N_susp);
            }
        }
    }
}


module spiral_suspensions(){
    
    delta_angle = 360/SPIRAL_NSUSP;///N_suspensions;
    z_angle = 360/N_susp;
    
    for(i=[0:N_suspensions-1],
        theta=i*delta_angle,
        translation=i*susp_distance
    ){
        translate([0,0,translation]){
            for(i=[0:N_susp-1],
                ntheta=theta+z_angle*i)
            {
                rotate([0,0,ntheta])
                if((i+1)%2 || UNIDIRECTIONAL_SUSP)
                    suspender();
                else
                    anti_suspender();
            }
        }
    }
    
}


module structure(){
    union(){
        core();
        #shell();
    }
}




union(){
    structure();
    intersection(){
        difference(){
            cylinder(h=preform_length, d=s_inner_diameter);
            cylinder(h=preform_length, d=core_diameter);
        }
        if(SPIRAL_SUSP)
            spiral_suspensions();
        else
            repeating_suspensions();
    }
    
    if (show_north){
        translate([-1.5, -s_outer_diameter/2+0.5, 0])
            rotate([90,0,0]) linear_extrude(1.5)
                text("N", size=3);
    }
}
